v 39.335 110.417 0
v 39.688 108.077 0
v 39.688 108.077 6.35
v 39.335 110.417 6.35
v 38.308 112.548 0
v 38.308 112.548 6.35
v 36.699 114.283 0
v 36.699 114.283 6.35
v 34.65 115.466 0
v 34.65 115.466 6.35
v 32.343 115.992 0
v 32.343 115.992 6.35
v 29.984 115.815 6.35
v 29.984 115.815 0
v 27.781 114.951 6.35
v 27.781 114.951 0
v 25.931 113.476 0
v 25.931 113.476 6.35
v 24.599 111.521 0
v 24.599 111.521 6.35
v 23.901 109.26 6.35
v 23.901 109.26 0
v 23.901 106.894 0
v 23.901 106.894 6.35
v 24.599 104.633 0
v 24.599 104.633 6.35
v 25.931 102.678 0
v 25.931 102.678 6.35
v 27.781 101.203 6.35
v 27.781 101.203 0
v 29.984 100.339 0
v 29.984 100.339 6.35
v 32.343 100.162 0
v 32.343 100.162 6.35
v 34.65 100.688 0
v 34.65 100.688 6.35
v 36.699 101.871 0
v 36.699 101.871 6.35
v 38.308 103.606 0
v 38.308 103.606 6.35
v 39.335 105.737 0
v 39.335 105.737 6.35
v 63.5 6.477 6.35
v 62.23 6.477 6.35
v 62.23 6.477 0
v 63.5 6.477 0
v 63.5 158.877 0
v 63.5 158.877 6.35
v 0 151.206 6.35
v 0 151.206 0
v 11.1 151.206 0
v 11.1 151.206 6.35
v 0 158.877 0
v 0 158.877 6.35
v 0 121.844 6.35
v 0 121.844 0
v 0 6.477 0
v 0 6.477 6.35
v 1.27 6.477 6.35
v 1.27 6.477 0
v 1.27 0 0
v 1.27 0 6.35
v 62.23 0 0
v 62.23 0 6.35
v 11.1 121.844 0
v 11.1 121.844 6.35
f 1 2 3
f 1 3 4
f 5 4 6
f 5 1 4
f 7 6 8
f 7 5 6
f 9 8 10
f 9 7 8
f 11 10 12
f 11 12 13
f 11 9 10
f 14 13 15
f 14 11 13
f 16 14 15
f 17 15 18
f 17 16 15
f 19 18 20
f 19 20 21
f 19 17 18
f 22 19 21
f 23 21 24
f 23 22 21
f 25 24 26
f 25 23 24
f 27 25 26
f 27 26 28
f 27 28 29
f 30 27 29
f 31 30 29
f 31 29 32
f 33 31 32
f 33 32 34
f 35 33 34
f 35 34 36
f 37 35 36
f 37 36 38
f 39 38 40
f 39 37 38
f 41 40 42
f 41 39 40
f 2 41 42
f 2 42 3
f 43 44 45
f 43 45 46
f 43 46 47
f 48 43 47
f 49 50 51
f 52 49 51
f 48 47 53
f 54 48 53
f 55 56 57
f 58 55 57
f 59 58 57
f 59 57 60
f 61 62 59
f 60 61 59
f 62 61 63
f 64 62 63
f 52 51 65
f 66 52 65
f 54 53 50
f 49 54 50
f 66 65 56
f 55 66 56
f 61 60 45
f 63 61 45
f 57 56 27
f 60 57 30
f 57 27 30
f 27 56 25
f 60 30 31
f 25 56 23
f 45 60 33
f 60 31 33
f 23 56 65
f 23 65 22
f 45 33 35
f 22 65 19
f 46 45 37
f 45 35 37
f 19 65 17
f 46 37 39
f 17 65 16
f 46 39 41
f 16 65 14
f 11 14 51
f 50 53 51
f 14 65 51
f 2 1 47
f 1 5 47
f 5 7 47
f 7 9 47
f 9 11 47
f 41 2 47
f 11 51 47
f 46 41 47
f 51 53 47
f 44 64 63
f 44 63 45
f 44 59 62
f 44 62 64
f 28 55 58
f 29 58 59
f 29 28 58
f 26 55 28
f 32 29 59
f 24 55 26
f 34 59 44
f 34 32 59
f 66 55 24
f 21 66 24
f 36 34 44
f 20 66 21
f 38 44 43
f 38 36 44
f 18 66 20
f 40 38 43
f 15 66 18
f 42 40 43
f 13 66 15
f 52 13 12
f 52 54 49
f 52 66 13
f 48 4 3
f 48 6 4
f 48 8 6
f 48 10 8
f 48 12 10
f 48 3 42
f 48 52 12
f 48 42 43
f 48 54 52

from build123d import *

# Parameters (mm, degrees)
SKETCH2_R           = 7.9375
BOSS_EXTRUDE1_DEPTH = 6.35
SKETCH3_W           = 1.27
SKETCH3_H           = 6.477
CUT_EXTRUDE1_DEPTH  = 7.35


with BuildPart() as part:
    # Sketch2 → Boss-Extrude1 (new body)
    with BuildSketch(Plane.XY):
        Polygon((0, 0), (63.5, 0), (63.5, 158.877), (0, 158.877), (0, 151.2062), (11.0998, 151.2062), (11.0998, 121.8438), (0, 121.8438), align=None)
        with Locations((31.75, 108.077)):
            Circle(SKETCH2_R, mode=Mode.SUBTRACT)
    extrude(amount=BOSS_EXTRUDE1_DEPTH)

    # Sketch3 → Cut-Extrude1 (cut, through all)
    with BuildSketch(Plane.XY.offset(6.35)):
        with Locations((0.635, 3.2385)):
            Rectangle(SKETCH3_W, SKETCH3_H)
        with Locations((62.865, 3.2385)):
            Rectangle(SKETCH3_W, SKETCH3_H)
    extrude(amount=-CUT_EXTRUDE1_DEPTH, mode=Mode.SUBTRACT)


solid = part.part
